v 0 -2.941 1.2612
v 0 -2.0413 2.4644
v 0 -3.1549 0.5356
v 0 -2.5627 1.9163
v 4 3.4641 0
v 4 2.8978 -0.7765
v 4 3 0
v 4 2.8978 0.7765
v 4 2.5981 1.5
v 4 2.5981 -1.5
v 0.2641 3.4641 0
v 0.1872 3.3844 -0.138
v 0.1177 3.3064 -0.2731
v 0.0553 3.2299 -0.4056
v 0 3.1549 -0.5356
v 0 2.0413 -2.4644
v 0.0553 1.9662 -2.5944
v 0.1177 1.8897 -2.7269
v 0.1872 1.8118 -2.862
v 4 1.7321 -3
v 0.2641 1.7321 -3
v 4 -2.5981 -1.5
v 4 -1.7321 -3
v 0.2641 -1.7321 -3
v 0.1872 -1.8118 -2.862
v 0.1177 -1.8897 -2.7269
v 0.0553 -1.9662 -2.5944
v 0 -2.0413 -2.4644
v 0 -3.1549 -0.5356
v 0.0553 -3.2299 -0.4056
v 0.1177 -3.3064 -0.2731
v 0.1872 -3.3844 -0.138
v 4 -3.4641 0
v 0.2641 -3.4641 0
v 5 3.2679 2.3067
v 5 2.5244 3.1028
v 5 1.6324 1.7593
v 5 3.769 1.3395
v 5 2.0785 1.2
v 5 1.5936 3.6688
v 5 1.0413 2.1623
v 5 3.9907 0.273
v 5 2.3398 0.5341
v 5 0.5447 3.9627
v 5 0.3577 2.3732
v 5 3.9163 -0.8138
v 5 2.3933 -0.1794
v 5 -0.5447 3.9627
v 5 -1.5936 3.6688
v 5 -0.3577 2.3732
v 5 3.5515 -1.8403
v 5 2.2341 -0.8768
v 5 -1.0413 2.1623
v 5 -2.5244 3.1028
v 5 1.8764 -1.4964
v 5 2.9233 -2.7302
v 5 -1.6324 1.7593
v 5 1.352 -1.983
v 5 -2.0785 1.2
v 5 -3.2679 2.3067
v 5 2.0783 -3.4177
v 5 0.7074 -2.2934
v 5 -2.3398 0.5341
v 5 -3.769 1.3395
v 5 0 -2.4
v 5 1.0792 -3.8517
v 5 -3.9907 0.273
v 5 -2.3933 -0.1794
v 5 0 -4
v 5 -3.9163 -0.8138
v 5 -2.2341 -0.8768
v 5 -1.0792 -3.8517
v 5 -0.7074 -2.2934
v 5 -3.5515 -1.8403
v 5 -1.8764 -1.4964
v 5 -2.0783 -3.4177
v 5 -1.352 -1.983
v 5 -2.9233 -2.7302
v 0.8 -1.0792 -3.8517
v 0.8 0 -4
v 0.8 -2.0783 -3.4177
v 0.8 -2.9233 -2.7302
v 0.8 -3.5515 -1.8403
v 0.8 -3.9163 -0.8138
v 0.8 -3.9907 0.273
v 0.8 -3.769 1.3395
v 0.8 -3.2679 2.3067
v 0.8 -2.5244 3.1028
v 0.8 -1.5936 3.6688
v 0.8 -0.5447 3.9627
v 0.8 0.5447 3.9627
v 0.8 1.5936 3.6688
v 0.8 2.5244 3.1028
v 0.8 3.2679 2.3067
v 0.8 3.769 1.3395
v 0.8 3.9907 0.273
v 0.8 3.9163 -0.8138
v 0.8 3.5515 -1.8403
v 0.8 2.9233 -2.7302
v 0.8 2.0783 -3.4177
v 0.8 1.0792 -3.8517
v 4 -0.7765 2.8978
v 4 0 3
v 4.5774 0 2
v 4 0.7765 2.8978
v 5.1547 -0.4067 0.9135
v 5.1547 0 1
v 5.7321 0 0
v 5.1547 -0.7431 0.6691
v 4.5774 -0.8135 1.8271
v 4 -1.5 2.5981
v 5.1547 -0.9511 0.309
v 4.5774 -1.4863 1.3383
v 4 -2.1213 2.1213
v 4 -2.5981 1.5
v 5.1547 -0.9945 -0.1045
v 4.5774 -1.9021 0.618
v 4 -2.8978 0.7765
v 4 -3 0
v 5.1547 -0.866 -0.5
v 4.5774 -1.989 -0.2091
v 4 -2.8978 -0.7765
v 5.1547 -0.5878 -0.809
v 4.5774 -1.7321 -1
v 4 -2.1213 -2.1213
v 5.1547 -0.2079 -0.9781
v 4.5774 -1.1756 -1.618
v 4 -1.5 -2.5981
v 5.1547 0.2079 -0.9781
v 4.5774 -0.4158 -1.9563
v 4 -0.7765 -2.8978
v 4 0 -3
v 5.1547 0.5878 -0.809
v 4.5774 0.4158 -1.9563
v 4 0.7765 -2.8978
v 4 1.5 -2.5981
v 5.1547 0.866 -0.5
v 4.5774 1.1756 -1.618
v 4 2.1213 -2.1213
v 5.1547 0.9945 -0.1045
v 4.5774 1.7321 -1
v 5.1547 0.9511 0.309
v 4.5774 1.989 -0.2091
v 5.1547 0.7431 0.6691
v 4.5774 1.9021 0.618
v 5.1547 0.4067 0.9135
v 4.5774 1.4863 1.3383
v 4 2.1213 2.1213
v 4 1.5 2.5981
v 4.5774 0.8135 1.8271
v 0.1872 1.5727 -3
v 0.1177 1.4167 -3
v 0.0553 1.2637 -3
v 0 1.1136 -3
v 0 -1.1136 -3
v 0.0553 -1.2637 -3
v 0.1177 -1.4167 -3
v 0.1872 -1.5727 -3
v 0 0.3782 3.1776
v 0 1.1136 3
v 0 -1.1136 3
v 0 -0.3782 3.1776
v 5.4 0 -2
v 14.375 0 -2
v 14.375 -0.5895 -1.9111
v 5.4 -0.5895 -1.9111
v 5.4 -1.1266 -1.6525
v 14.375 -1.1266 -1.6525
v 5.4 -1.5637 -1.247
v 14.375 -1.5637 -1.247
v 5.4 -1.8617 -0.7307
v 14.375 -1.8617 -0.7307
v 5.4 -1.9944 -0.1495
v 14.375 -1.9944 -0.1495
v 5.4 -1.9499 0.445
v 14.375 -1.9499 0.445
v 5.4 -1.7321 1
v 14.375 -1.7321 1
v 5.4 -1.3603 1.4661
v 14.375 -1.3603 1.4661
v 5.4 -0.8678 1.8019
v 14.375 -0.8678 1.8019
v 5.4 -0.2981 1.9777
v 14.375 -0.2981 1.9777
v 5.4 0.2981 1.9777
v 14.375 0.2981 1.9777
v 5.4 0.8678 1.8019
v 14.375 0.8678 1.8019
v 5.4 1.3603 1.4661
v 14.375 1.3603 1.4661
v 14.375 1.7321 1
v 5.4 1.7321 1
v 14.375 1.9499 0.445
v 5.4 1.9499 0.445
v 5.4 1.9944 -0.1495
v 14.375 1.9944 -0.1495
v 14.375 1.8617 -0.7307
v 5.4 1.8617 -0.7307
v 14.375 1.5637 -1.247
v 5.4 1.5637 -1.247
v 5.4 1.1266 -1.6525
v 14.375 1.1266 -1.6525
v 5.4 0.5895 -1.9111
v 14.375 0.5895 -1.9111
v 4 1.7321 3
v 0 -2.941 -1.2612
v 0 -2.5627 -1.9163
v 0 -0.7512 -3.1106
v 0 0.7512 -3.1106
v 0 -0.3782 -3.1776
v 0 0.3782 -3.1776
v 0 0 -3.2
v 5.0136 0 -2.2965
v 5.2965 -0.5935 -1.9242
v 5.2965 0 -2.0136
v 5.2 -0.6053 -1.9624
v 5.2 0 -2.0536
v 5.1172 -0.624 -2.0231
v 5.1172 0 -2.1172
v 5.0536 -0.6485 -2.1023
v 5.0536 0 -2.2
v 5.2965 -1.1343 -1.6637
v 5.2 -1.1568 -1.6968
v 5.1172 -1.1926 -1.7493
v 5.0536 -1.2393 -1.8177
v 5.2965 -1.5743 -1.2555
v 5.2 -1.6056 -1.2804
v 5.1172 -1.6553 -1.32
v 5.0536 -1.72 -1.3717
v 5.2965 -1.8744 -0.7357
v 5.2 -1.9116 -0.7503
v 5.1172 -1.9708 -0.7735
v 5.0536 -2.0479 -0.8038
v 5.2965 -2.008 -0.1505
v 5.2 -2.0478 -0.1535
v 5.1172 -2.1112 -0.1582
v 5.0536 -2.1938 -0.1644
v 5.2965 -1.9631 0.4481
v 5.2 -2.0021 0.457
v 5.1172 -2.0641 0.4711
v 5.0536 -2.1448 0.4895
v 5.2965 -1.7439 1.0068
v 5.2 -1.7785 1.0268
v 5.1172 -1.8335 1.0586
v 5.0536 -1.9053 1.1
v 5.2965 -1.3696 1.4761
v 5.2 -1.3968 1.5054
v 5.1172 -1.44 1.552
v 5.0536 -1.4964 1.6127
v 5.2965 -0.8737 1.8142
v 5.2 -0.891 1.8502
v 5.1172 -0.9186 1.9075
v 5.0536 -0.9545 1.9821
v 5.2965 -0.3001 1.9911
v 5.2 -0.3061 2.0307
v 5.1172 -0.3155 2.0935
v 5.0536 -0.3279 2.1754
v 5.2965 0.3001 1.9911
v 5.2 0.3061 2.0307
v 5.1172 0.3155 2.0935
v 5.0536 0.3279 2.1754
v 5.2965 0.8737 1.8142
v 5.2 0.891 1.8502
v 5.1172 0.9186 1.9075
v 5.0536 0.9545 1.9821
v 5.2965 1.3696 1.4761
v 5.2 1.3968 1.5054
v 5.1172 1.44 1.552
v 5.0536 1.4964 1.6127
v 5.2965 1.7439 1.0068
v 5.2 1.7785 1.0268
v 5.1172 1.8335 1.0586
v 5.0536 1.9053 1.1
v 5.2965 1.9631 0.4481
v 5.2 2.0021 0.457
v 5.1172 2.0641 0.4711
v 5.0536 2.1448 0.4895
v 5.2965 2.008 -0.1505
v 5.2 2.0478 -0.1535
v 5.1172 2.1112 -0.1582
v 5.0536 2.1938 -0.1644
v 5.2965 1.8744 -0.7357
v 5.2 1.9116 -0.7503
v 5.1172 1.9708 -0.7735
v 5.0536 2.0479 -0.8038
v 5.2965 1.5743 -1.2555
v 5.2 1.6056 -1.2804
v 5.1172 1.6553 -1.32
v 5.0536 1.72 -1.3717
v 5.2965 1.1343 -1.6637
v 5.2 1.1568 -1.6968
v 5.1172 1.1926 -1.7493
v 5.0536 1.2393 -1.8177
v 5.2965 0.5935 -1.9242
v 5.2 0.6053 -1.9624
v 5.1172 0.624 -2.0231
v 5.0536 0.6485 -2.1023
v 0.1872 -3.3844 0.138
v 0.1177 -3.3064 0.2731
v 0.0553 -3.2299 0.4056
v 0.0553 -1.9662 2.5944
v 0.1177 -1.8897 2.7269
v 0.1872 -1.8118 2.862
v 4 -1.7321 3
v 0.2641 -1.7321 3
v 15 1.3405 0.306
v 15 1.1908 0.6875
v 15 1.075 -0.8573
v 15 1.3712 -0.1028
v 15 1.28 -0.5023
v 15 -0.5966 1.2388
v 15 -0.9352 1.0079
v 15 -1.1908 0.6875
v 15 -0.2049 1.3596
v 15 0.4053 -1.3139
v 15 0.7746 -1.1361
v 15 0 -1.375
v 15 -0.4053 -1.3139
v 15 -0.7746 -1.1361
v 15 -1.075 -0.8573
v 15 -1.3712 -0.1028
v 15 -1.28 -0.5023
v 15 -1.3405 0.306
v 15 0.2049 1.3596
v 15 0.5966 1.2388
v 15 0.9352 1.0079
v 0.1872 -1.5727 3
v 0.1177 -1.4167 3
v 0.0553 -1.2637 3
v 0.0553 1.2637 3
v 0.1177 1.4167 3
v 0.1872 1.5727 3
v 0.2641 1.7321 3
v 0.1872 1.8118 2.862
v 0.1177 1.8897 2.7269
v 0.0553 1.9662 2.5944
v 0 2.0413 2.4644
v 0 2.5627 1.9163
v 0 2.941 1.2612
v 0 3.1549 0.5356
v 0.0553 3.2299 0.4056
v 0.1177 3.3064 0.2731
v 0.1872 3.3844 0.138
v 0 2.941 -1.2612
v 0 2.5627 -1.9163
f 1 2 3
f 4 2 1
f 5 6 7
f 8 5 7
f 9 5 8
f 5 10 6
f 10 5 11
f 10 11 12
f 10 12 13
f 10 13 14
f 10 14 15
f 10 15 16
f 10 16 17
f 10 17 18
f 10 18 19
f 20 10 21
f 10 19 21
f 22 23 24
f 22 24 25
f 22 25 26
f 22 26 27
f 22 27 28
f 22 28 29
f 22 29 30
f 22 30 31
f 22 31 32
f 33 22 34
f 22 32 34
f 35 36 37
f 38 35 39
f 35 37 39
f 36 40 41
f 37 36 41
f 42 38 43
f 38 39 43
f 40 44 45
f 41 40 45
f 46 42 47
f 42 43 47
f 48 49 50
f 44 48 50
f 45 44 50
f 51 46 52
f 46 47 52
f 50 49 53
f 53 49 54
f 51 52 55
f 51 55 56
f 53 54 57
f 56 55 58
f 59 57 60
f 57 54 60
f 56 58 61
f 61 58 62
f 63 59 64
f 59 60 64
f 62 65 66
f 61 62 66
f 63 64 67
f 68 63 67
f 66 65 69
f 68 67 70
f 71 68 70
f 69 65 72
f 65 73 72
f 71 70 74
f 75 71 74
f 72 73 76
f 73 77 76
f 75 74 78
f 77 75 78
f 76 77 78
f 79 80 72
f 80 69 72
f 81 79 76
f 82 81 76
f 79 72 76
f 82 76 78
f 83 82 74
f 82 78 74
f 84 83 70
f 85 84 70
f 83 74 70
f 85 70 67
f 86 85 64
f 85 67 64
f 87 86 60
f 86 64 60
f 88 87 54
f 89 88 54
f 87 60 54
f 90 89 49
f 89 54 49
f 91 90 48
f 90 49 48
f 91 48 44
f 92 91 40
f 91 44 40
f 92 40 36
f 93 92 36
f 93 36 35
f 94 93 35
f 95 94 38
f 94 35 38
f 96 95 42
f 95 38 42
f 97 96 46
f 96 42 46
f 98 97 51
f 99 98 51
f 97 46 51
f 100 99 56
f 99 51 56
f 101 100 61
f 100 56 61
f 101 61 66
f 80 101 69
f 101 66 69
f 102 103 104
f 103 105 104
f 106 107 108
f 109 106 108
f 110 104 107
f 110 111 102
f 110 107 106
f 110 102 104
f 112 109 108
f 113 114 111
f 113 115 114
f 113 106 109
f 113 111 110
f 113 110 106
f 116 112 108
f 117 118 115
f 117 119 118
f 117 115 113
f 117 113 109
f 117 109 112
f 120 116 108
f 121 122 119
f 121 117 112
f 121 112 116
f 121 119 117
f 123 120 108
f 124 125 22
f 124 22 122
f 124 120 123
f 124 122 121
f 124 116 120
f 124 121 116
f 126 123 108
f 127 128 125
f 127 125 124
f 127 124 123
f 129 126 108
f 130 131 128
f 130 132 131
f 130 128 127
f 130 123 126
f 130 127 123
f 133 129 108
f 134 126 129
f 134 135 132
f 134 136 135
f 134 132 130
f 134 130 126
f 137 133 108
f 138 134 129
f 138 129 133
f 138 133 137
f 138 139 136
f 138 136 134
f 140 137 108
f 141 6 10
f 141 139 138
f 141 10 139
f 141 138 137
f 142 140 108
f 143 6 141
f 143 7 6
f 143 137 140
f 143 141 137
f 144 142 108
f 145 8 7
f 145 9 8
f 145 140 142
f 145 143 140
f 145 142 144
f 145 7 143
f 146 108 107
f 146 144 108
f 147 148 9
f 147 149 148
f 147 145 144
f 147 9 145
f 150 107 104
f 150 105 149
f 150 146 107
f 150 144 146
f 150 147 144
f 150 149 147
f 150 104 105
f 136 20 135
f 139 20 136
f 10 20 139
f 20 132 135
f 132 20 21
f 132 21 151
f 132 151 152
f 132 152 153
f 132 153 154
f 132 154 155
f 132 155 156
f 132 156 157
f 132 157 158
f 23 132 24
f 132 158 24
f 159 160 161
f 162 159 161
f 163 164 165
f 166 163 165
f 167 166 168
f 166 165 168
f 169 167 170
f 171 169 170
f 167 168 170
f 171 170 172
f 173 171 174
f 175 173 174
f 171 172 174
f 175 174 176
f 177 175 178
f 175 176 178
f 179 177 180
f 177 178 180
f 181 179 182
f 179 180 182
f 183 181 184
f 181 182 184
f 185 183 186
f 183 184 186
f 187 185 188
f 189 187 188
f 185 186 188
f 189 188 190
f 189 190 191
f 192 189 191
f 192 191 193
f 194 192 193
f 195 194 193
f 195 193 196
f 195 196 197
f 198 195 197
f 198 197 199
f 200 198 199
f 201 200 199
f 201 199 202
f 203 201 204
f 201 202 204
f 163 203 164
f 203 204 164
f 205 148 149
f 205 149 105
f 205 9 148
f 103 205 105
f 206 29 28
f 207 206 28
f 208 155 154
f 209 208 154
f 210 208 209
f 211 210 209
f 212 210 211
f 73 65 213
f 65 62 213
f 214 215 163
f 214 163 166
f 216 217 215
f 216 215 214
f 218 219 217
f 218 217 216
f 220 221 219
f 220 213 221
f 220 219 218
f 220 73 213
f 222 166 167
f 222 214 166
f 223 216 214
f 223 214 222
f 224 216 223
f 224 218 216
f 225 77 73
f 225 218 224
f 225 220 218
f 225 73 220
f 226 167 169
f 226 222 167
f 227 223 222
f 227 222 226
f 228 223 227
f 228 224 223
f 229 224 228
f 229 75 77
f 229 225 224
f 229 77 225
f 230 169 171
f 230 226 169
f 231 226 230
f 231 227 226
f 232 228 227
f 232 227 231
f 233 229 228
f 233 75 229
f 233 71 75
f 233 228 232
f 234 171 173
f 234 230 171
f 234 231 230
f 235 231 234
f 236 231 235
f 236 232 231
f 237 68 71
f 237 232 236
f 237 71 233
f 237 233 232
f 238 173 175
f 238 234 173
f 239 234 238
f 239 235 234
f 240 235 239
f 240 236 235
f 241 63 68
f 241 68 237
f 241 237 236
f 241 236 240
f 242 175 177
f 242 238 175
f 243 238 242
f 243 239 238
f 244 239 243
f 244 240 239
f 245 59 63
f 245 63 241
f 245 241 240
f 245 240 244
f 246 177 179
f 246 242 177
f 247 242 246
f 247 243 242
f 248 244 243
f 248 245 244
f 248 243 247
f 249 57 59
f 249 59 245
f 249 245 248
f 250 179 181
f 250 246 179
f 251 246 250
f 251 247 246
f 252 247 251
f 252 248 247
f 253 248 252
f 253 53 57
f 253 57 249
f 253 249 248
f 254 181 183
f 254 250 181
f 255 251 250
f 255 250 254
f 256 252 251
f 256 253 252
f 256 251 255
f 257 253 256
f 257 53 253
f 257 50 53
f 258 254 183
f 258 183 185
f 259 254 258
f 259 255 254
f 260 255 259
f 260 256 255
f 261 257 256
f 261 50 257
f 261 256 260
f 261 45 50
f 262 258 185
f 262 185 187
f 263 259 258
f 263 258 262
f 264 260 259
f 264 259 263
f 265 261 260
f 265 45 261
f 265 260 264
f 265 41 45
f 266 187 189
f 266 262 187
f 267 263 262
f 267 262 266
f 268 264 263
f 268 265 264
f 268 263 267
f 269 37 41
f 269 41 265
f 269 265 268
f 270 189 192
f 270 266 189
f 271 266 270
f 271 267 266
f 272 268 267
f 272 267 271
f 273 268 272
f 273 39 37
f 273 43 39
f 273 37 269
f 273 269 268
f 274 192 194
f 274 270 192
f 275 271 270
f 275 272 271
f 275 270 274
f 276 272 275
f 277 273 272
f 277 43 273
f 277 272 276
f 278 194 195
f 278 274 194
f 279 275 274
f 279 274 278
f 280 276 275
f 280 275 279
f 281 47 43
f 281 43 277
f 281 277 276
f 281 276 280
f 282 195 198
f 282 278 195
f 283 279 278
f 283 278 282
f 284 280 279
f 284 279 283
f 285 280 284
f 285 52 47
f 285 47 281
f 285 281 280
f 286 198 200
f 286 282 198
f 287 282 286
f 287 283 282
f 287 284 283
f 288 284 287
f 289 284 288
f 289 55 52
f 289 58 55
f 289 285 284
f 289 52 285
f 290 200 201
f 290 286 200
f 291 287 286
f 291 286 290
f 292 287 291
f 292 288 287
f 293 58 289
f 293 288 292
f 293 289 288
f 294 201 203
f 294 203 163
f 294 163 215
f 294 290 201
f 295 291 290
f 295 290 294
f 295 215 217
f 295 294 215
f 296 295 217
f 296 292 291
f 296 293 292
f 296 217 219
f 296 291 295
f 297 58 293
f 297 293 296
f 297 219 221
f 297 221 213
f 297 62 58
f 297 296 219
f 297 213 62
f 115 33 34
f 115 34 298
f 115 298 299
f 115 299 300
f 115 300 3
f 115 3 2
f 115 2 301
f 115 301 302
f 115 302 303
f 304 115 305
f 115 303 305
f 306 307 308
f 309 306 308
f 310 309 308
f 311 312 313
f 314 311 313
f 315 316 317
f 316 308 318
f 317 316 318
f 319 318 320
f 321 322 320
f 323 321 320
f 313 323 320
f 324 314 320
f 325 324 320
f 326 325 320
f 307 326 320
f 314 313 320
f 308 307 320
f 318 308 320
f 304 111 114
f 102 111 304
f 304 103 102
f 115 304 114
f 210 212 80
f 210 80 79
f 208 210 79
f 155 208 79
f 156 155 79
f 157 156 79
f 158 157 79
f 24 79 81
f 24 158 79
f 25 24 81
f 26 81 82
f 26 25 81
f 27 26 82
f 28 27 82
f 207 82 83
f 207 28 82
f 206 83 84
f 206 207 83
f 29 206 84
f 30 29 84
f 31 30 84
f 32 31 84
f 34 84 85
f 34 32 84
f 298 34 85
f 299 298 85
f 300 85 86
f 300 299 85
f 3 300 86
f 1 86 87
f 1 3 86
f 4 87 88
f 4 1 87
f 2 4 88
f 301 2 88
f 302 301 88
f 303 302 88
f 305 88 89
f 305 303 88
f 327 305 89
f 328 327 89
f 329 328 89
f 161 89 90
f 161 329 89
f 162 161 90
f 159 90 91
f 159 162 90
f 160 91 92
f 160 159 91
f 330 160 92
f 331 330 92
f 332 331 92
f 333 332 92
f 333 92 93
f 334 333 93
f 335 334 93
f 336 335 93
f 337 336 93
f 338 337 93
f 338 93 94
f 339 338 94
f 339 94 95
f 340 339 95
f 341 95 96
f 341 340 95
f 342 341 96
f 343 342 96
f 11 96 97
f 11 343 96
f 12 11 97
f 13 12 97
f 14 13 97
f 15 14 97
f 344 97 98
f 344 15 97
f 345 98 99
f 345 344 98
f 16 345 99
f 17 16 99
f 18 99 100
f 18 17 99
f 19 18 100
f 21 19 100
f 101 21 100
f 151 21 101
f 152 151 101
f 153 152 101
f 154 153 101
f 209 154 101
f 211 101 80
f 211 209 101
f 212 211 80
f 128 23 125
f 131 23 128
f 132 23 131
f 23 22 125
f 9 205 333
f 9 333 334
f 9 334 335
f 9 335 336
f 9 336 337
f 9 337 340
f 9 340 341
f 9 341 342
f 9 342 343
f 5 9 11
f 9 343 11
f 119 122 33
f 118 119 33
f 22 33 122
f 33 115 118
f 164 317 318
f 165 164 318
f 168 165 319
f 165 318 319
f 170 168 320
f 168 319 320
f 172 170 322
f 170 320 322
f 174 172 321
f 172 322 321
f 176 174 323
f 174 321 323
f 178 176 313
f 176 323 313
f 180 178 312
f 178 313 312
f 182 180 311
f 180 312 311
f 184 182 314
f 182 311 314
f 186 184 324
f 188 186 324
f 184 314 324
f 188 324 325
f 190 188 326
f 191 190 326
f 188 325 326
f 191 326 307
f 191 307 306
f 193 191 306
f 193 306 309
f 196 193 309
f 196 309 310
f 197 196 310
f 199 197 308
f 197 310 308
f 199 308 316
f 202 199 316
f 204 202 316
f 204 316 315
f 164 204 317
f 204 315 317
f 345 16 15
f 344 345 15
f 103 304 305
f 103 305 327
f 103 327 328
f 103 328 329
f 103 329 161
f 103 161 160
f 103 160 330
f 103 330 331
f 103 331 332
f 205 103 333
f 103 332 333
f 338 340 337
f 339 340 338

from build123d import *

# Parameters (mm, degrees)
CHAMFER1_SIZE      = 0.625
CUT_EXTRUDE1_DEPTH = 4
CHAMFER2_SIZE      = 0.8
FILLET1_R          = 0.4


with BuildPart() as part:
    # Sketch1 → Revolve1 (revolve)
    with BuildSketch(Plane(origin=(0, 0, 0), x_dir=(1, 0, 0), z_dir=(0, 1, 0))):
        Polygon((0, 0), (0, 4), (5, 4), (5, 2), (15, 2), (15, 0), align=None)
    revolve(axis=Axis((15, 0, 0), (-1, 0, 0)))

    # Chamfer1
    chamfer1_edges = [part.edges().sort_by_distance(p)[0] for p in [
        (15, 0, 2),
    ]]
    chamfer(chamfer1_edges, length=CHAMFER1_SIZE)

    # Sketch3 → Cut-Revolve1 (revolve, cut)
    with BuildSketch(Plane(origin=(0, 0, 0), x_dir=(1, 0, 0), z_dir=(0, 1, 0)), mode=Mode.PRIVATE) as cut_revolve1_sk:
        Polygon((0, 0), (5.732050808, 0), (4, 3), (0, 3), align=None)
    revolve(cut_revolve1_sk.sketch.rotate(Axis((0, 0, 0), (1, 0, 0)), 180), axis=Axis((0, 0, 0), (1, 0, 0)), mode=Mode.SUBTRACT)

    # Sketch2 → Cut-Extrude1 (cut)
    with BuildSketch(Plane.ZY):
        Polygon((0, 3.464101615), (-3, 1.732050808), (-3, -1.732050808), (0, -3.464101615), (3, -1.732050808), (3, 1.732050808), align=None)
    extrude(amount=-CUT_EXTRUDE1_DEPTH, mode=Mode.SUBTRACT)

    # Chamfer2
    # the kernel refuses this chamfer: 0.8 mm, written as the material it takes off along each edge
    with BuildSketch(Plane(origin=(0, 0, 0), x_dir=(0, 0, -1), z_dir=(0, 1, 0))) as chamfer2_piece_1:
        Polygon((4, -CHAMFER2_SIZE), (4 - CHAMFER2_SIZE, 0), (4, 0), align=None)
    revolve(axis=Axis((0, 0, 0), (-1, 0, 0)), mode=Mode.SUBTRACT)

    # Fillet1
    fillet1_edges = [part.edges().sort_by_distance(p)[0] for p in [
        (5, 0, 2),
    ]]
    fillet(fillet1_edges, radius=FILLET1_R)


solid = part.part
